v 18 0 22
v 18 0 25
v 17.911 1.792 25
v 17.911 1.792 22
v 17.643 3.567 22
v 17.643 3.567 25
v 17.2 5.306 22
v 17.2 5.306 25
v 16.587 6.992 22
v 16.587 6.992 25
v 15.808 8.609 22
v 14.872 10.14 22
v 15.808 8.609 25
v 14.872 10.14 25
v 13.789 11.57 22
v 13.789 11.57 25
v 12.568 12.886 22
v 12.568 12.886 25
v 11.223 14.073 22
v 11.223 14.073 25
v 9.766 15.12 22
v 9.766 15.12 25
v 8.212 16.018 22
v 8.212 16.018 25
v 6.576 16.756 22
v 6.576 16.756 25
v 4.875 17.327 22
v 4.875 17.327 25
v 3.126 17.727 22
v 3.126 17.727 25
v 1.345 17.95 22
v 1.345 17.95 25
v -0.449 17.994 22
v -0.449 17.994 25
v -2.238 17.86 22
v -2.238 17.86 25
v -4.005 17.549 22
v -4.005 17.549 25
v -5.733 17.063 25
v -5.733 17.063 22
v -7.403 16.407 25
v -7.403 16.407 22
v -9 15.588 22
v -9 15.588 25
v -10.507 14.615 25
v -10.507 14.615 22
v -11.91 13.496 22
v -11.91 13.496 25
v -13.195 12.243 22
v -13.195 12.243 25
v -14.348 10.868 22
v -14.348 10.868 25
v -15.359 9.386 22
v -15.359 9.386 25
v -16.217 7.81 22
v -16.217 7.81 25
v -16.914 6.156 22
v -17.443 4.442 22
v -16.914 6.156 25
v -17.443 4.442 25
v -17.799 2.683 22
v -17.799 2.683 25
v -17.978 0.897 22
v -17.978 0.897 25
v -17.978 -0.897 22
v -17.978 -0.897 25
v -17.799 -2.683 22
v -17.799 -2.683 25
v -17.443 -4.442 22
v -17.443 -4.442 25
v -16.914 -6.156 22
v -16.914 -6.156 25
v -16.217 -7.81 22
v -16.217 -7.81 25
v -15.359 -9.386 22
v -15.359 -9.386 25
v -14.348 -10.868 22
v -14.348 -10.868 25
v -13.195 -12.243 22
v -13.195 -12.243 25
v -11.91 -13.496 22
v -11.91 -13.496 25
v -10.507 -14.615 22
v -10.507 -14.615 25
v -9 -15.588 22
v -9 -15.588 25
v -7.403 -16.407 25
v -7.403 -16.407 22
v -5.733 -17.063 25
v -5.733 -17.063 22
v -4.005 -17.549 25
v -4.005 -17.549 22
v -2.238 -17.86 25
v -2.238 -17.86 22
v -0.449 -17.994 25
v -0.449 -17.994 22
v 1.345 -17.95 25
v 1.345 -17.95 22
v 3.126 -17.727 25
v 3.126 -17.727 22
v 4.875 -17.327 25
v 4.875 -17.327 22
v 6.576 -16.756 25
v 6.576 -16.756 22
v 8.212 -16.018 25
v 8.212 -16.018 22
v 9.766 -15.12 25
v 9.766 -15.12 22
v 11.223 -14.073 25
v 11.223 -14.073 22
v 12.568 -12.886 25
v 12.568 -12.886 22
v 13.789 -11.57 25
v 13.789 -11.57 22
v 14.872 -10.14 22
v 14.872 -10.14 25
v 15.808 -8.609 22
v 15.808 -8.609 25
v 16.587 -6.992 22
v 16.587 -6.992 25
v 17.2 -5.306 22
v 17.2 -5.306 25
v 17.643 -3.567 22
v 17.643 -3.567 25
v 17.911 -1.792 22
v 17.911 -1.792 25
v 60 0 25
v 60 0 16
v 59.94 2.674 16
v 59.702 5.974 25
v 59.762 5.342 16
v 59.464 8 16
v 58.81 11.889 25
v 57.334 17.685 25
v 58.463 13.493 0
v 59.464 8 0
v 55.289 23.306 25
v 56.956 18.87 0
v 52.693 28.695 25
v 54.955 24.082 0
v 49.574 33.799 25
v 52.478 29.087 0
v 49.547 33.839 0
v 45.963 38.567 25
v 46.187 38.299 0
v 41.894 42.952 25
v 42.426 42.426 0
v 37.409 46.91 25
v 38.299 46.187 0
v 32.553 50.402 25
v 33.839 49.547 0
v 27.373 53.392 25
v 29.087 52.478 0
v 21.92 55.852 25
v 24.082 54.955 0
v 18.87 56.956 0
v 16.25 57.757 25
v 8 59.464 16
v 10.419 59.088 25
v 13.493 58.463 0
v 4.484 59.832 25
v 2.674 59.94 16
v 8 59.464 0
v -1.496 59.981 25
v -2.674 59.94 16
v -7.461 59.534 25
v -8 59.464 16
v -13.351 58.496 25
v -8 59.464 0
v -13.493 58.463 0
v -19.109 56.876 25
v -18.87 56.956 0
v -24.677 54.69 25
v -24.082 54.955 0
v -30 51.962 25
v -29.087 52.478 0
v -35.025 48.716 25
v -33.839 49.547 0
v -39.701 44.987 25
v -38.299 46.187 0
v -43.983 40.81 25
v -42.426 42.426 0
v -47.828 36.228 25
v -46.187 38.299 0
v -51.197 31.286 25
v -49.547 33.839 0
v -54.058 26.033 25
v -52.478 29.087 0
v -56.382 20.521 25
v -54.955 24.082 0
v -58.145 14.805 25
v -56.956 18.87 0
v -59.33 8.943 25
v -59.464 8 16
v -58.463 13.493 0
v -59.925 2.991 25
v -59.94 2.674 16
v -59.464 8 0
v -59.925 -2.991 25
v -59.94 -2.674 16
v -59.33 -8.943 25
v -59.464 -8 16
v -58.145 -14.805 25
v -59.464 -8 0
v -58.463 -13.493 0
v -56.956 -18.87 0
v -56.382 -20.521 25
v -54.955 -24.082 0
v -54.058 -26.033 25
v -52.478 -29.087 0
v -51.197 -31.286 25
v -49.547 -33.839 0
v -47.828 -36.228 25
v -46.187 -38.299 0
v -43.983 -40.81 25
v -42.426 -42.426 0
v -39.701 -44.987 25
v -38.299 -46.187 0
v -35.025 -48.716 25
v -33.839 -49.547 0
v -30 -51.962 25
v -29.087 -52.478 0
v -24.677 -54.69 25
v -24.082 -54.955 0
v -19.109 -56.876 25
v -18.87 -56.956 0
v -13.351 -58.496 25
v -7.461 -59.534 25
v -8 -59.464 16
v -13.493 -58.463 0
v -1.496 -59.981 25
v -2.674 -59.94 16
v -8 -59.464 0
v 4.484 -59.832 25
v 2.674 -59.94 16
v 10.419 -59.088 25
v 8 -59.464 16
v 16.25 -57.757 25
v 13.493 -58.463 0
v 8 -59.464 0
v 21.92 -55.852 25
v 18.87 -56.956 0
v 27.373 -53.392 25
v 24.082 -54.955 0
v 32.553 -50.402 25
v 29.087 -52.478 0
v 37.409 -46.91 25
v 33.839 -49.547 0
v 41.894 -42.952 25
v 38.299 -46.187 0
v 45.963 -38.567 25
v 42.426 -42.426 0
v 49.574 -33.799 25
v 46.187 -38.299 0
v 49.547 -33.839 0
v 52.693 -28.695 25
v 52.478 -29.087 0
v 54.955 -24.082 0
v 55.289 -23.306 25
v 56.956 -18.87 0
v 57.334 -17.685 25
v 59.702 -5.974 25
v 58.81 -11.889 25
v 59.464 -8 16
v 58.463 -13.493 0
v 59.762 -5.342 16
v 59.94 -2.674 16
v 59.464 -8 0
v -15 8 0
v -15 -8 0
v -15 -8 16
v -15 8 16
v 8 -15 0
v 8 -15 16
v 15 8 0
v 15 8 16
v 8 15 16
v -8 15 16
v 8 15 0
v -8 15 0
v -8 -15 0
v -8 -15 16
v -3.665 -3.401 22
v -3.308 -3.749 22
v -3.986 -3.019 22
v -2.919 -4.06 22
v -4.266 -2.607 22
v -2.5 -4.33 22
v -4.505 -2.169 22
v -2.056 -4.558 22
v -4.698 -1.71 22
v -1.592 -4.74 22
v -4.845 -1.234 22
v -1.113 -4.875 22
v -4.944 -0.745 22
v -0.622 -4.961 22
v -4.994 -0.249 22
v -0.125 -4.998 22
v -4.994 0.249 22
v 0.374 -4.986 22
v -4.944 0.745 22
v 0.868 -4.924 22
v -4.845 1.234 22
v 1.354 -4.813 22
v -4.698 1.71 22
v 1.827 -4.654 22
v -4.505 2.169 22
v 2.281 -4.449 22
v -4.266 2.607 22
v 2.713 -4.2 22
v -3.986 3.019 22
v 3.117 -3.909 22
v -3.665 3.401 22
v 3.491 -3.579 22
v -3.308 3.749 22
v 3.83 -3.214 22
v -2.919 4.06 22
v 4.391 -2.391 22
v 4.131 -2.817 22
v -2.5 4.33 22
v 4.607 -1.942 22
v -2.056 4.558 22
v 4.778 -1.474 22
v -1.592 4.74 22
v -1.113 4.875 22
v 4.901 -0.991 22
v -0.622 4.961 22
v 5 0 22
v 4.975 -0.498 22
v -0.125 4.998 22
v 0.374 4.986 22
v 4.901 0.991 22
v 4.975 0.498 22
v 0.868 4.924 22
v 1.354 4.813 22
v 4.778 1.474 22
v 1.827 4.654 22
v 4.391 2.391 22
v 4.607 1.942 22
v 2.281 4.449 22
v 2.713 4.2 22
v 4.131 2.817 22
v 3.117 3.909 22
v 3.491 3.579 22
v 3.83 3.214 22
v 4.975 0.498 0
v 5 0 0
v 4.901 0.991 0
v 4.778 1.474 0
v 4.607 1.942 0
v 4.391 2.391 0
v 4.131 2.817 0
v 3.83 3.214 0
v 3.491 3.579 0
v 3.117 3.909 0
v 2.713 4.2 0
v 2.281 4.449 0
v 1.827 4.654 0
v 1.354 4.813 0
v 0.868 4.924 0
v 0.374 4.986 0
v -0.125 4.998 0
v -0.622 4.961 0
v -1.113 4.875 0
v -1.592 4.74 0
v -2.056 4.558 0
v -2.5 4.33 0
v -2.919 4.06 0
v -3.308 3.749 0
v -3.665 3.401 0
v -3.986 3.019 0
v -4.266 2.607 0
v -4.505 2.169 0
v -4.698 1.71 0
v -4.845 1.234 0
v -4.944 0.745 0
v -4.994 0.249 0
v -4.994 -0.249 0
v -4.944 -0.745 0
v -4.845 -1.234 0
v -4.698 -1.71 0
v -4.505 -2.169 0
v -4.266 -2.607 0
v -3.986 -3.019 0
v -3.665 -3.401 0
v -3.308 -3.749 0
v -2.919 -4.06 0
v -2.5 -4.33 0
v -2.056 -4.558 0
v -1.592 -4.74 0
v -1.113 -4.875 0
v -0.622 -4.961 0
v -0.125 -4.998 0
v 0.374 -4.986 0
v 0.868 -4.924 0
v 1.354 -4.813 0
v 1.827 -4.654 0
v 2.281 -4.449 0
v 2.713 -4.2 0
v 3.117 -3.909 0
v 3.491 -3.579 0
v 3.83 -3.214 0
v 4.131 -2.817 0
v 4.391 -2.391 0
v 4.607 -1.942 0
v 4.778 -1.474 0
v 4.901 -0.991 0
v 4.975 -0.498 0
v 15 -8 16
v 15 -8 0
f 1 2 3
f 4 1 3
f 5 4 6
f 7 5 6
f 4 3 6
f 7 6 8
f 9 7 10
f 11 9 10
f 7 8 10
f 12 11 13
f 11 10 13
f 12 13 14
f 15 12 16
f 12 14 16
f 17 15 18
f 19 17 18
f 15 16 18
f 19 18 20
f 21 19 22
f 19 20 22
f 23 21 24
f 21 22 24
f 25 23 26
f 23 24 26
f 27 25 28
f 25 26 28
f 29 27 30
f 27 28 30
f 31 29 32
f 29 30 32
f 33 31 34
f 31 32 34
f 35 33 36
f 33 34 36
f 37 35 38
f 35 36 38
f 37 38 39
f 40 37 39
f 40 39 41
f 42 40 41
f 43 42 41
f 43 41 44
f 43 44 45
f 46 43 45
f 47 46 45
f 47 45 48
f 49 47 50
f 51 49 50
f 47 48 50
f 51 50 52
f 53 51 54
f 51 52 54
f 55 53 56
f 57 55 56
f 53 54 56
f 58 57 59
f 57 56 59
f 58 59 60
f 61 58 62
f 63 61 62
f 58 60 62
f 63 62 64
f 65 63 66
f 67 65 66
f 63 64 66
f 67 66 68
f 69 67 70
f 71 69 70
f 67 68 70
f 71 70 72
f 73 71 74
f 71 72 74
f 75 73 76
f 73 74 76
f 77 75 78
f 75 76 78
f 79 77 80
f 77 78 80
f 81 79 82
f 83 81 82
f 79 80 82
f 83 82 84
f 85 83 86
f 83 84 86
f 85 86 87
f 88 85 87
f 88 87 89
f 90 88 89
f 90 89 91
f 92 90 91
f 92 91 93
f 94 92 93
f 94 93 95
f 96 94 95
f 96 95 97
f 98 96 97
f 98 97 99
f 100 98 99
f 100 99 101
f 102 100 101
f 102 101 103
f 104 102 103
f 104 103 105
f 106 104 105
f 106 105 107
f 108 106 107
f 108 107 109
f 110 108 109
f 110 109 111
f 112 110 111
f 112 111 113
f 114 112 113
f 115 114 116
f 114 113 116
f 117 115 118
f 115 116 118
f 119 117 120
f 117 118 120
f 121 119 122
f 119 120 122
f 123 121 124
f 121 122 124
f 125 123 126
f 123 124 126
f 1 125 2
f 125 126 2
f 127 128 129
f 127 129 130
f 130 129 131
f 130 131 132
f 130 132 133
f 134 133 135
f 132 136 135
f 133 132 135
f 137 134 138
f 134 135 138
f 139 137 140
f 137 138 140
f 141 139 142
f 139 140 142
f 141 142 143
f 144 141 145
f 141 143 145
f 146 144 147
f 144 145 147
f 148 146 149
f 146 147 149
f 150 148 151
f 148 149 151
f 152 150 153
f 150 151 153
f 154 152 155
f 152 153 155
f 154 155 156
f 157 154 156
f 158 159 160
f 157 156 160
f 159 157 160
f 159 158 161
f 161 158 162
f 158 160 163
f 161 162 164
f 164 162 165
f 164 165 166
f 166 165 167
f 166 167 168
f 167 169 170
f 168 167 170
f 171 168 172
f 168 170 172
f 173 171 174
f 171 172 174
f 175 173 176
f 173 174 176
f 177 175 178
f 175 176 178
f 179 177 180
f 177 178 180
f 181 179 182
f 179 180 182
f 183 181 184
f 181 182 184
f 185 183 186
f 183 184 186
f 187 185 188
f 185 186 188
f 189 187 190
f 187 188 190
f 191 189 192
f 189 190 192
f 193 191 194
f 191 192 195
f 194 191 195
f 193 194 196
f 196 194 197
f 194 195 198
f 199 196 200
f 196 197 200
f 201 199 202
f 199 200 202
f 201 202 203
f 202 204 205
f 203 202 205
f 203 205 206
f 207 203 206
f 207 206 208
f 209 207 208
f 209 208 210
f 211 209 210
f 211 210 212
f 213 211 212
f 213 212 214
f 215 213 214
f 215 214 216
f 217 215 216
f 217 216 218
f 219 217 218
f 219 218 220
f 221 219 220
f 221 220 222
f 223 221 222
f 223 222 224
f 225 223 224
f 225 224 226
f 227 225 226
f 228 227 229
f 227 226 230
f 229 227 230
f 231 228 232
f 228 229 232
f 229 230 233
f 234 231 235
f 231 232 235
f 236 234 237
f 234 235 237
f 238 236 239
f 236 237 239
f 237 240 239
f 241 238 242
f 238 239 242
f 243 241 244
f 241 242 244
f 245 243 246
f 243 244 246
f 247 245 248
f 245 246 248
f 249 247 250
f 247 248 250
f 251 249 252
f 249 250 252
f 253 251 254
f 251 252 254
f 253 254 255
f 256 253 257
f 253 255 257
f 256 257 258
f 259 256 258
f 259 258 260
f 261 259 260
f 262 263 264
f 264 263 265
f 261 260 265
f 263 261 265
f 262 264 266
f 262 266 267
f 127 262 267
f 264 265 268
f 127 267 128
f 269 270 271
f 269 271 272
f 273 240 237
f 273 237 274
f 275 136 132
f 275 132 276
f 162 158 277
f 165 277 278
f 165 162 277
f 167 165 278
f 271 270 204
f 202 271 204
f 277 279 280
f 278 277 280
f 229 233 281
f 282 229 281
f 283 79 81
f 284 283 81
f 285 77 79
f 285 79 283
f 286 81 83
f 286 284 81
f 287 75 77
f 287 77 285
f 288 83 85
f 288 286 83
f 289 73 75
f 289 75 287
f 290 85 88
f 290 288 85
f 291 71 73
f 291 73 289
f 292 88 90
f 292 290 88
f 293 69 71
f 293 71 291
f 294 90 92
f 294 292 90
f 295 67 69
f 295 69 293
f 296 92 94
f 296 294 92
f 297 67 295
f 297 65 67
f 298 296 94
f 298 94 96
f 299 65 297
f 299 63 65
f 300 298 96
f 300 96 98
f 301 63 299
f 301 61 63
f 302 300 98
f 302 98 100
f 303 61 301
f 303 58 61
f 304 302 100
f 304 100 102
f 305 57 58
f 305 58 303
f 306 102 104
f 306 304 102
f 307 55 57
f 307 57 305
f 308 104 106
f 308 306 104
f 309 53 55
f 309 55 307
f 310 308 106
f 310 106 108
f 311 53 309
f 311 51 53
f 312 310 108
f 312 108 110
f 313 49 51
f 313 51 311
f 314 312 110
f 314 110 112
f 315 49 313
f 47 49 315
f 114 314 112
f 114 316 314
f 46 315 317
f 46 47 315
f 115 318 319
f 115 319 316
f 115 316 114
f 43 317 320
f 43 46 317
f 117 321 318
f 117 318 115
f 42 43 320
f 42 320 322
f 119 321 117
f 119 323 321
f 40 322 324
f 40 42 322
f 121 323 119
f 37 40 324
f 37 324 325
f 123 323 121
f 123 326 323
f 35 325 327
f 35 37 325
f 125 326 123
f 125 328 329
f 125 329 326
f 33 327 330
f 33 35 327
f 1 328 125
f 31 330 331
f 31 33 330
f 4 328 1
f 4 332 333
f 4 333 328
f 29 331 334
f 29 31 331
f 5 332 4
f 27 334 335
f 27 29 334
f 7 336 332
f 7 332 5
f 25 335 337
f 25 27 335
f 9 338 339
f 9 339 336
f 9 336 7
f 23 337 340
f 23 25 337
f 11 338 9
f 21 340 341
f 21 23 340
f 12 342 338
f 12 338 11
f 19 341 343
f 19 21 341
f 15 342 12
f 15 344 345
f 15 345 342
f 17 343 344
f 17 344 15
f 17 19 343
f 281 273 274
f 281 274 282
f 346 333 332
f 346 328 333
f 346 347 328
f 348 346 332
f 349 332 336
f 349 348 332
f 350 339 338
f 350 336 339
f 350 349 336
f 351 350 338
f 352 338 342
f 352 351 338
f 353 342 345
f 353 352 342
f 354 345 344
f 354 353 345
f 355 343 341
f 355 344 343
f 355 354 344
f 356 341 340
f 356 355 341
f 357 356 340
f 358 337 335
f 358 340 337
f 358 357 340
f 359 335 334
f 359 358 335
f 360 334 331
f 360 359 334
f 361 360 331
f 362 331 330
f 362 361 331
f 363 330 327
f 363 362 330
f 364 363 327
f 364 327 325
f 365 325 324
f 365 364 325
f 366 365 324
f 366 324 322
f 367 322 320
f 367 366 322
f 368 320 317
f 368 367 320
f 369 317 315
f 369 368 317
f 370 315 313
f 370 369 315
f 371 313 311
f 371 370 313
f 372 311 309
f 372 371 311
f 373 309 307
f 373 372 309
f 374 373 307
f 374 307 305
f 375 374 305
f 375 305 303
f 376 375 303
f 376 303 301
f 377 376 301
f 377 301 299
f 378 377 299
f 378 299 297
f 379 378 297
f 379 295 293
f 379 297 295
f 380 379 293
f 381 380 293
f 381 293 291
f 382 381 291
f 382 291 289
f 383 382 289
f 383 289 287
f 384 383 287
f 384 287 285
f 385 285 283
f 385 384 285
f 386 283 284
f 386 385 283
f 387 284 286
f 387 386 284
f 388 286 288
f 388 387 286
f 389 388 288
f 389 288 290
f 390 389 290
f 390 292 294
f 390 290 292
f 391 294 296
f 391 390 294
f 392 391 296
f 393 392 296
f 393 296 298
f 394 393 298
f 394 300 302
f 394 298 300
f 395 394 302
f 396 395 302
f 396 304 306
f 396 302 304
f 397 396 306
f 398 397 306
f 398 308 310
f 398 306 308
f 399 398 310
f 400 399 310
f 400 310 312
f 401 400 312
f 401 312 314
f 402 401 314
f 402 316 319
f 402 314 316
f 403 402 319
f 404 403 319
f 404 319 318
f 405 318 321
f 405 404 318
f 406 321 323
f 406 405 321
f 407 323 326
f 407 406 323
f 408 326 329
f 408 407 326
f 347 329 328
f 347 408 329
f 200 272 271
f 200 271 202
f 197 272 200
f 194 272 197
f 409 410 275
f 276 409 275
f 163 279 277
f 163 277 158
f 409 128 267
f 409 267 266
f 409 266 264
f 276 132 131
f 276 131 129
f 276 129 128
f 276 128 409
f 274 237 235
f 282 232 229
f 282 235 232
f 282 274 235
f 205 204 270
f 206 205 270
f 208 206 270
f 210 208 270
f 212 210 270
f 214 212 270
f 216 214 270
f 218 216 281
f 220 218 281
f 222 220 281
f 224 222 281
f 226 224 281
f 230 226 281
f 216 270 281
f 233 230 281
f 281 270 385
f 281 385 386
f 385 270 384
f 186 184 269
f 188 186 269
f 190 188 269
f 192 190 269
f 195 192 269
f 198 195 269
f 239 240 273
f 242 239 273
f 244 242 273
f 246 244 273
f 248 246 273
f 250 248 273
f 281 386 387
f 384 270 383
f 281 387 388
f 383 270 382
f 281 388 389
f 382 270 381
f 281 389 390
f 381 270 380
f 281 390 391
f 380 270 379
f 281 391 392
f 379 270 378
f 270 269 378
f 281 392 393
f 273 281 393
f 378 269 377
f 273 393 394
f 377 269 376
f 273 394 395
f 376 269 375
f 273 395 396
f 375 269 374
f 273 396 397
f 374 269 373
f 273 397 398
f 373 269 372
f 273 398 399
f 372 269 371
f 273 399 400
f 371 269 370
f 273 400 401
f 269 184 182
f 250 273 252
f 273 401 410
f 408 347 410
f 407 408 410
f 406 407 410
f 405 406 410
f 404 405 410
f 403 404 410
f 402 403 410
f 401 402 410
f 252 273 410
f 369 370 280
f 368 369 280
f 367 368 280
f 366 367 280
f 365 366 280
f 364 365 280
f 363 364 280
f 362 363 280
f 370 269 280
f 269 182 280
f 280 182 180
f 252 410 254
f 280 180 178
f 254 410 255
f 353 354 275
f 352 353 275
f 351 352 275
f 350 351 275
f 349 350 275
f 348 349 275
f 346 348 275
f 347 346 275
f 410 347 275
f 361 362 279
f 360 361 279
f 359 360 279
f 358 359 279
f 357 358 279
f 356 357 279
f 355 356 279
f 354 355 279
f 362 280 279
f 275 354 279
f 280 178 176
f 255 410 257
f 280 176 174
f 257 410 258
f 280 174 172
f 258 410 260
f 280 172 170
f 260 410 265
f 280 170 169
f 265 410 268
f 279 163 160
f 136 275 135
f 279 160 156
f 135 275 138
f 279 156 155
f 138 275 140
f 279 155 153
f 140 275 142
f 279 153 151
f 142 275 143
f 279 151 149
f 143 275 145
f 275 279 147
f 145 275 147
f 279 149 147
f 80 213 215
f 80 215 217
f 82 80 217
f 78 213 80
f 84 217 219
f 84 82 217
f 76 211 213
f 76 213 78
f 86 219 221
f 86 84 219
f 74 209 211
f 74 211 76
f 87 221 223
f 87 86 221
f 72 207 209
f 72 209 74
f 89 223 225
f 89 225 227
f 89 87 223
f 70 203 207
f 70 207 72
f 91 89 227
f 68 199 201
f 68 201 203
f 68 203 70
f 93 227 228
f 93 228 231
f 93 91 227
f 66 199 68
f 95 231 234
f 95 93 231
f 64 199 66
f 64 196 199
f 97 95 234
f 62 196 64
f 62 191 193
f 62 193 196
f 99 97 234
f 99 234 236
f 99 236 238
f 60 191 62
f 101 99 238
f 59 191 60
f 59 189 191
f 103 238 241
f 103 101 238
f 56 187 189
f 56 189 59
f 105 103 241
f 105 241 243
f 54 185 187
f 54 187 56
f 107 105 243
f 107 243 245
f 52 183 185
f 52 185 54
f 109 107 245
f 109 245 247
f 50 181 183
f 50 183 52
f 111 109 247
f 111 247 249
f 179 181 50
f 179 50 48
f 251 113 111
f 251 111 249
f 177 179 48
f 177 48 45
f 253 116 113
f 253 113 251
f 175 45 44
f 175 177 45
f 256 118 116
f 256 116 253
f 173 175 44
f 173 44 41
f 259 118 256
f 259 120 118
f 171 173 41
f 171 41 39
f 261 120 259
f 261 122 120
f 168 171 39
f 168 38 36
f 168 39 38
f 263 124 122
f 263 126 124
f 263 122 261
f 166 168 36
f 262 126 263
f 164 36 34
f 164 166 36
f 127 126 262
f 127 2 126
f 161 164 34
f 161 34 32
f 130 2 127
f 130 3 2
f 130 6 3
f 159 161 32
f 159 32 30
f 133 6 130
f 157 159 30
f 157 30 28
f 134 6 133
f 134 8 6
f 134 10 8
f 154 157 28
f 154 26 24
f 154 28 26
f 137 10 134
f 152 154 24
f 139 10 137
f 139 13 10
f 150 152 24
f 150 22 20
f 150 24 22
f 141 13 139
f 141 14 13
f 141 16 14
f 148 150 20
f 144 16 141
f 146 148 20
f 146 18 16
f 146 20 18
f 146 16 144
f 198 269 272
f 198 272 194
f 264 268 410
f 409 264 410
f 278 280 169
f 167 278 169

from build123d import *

# Parameters (mm, degrees)
ESQUISSE1_R                  = 60
BOSS_EXTRU_1_DEPTH           = 25
ESQUISSE2_R                  = 18
ENL_V_MAT_EXTRU_1_DEPTH      = 3
ENL_V_MAT_EXTRU_2_DEPTH      = 88.658428003
ENL_V_MAT_EXTRU_2_DEPTH_BACK = 88.658428003
ESQUISSE3_R                  = 5
ESQUISSE4_W                  = 45
ESQUISSE4_H                  = 16
ESQUISSE4_W_2                = 16
ESQUISSE4_H_2                = 45
ENL_V_MAT_EXTRU_3_DEPTH      = 16


with BuildPart() as part:
    # Esquisse1 → Boss.-Extru.1 (new body)
    with BuildSketch(Plane.XY):
        Circle(ESQUISSE1_R)
    extrude(amount=BOSS_EXTRU_1_DEPTH)

    # Esquisse2 → Enlèv. mat.-Extru.1 (cut)
    with BuildSketch(Plane.XY.offset(25)):
        Circle(ESQUISSE2_R)
    extrude(amount=-ENL_V_MAT_EXTRU_1_DEPTH, mode=Mode.SUBTRACT)

    # Esquisse3 → Enlèv. mat.-Extru.2 (cut, two sides: drawn at the far end of the back side and taken through both)
    with BuildSketch(Plane.XY.offset(22).offset(-ENL_V_MAT_EXTRU_2_DEPTH_BACK)):
        Circle(ESQUISSE3_R)
    extrude(amount=ENL_V_MAT_EXTRU_2_DEPTH + ENL_V_MAT_EXTRU_2_DEPTH_BACK, mode=Mode.SUBTRACT)

    # Esquisse4 → Enlèv. mat.-Extru.3 (cut)
    with BuildSketch(Plane(origin=(0, 0, 0), x_dir=(-1, 0, 0), z_dir=(0, 0, -1))):
        with Locations((37.5, 0)):
            Rectangle(ESQUISSE4_W, ESQUISSE4_H)
        with Locations((0, -37.5)):
            Rectangle(ESQUISSE4_W_2, ESQUISSE4_H_2)
        with Locations((-37.5, 0)):
            Rectangle(ESQUISSE4_W, ESQUISSE4_H)
        with Locations((0, 37.5)):
            Rectangle(ESQUISSE4_W_2, ESQUISSE4_H_2)
    extrude(amount=-ENL_V_MAT_EXTRU_3_DEPTH, mode=Mode.SUBTRACT)


solid = part.part
